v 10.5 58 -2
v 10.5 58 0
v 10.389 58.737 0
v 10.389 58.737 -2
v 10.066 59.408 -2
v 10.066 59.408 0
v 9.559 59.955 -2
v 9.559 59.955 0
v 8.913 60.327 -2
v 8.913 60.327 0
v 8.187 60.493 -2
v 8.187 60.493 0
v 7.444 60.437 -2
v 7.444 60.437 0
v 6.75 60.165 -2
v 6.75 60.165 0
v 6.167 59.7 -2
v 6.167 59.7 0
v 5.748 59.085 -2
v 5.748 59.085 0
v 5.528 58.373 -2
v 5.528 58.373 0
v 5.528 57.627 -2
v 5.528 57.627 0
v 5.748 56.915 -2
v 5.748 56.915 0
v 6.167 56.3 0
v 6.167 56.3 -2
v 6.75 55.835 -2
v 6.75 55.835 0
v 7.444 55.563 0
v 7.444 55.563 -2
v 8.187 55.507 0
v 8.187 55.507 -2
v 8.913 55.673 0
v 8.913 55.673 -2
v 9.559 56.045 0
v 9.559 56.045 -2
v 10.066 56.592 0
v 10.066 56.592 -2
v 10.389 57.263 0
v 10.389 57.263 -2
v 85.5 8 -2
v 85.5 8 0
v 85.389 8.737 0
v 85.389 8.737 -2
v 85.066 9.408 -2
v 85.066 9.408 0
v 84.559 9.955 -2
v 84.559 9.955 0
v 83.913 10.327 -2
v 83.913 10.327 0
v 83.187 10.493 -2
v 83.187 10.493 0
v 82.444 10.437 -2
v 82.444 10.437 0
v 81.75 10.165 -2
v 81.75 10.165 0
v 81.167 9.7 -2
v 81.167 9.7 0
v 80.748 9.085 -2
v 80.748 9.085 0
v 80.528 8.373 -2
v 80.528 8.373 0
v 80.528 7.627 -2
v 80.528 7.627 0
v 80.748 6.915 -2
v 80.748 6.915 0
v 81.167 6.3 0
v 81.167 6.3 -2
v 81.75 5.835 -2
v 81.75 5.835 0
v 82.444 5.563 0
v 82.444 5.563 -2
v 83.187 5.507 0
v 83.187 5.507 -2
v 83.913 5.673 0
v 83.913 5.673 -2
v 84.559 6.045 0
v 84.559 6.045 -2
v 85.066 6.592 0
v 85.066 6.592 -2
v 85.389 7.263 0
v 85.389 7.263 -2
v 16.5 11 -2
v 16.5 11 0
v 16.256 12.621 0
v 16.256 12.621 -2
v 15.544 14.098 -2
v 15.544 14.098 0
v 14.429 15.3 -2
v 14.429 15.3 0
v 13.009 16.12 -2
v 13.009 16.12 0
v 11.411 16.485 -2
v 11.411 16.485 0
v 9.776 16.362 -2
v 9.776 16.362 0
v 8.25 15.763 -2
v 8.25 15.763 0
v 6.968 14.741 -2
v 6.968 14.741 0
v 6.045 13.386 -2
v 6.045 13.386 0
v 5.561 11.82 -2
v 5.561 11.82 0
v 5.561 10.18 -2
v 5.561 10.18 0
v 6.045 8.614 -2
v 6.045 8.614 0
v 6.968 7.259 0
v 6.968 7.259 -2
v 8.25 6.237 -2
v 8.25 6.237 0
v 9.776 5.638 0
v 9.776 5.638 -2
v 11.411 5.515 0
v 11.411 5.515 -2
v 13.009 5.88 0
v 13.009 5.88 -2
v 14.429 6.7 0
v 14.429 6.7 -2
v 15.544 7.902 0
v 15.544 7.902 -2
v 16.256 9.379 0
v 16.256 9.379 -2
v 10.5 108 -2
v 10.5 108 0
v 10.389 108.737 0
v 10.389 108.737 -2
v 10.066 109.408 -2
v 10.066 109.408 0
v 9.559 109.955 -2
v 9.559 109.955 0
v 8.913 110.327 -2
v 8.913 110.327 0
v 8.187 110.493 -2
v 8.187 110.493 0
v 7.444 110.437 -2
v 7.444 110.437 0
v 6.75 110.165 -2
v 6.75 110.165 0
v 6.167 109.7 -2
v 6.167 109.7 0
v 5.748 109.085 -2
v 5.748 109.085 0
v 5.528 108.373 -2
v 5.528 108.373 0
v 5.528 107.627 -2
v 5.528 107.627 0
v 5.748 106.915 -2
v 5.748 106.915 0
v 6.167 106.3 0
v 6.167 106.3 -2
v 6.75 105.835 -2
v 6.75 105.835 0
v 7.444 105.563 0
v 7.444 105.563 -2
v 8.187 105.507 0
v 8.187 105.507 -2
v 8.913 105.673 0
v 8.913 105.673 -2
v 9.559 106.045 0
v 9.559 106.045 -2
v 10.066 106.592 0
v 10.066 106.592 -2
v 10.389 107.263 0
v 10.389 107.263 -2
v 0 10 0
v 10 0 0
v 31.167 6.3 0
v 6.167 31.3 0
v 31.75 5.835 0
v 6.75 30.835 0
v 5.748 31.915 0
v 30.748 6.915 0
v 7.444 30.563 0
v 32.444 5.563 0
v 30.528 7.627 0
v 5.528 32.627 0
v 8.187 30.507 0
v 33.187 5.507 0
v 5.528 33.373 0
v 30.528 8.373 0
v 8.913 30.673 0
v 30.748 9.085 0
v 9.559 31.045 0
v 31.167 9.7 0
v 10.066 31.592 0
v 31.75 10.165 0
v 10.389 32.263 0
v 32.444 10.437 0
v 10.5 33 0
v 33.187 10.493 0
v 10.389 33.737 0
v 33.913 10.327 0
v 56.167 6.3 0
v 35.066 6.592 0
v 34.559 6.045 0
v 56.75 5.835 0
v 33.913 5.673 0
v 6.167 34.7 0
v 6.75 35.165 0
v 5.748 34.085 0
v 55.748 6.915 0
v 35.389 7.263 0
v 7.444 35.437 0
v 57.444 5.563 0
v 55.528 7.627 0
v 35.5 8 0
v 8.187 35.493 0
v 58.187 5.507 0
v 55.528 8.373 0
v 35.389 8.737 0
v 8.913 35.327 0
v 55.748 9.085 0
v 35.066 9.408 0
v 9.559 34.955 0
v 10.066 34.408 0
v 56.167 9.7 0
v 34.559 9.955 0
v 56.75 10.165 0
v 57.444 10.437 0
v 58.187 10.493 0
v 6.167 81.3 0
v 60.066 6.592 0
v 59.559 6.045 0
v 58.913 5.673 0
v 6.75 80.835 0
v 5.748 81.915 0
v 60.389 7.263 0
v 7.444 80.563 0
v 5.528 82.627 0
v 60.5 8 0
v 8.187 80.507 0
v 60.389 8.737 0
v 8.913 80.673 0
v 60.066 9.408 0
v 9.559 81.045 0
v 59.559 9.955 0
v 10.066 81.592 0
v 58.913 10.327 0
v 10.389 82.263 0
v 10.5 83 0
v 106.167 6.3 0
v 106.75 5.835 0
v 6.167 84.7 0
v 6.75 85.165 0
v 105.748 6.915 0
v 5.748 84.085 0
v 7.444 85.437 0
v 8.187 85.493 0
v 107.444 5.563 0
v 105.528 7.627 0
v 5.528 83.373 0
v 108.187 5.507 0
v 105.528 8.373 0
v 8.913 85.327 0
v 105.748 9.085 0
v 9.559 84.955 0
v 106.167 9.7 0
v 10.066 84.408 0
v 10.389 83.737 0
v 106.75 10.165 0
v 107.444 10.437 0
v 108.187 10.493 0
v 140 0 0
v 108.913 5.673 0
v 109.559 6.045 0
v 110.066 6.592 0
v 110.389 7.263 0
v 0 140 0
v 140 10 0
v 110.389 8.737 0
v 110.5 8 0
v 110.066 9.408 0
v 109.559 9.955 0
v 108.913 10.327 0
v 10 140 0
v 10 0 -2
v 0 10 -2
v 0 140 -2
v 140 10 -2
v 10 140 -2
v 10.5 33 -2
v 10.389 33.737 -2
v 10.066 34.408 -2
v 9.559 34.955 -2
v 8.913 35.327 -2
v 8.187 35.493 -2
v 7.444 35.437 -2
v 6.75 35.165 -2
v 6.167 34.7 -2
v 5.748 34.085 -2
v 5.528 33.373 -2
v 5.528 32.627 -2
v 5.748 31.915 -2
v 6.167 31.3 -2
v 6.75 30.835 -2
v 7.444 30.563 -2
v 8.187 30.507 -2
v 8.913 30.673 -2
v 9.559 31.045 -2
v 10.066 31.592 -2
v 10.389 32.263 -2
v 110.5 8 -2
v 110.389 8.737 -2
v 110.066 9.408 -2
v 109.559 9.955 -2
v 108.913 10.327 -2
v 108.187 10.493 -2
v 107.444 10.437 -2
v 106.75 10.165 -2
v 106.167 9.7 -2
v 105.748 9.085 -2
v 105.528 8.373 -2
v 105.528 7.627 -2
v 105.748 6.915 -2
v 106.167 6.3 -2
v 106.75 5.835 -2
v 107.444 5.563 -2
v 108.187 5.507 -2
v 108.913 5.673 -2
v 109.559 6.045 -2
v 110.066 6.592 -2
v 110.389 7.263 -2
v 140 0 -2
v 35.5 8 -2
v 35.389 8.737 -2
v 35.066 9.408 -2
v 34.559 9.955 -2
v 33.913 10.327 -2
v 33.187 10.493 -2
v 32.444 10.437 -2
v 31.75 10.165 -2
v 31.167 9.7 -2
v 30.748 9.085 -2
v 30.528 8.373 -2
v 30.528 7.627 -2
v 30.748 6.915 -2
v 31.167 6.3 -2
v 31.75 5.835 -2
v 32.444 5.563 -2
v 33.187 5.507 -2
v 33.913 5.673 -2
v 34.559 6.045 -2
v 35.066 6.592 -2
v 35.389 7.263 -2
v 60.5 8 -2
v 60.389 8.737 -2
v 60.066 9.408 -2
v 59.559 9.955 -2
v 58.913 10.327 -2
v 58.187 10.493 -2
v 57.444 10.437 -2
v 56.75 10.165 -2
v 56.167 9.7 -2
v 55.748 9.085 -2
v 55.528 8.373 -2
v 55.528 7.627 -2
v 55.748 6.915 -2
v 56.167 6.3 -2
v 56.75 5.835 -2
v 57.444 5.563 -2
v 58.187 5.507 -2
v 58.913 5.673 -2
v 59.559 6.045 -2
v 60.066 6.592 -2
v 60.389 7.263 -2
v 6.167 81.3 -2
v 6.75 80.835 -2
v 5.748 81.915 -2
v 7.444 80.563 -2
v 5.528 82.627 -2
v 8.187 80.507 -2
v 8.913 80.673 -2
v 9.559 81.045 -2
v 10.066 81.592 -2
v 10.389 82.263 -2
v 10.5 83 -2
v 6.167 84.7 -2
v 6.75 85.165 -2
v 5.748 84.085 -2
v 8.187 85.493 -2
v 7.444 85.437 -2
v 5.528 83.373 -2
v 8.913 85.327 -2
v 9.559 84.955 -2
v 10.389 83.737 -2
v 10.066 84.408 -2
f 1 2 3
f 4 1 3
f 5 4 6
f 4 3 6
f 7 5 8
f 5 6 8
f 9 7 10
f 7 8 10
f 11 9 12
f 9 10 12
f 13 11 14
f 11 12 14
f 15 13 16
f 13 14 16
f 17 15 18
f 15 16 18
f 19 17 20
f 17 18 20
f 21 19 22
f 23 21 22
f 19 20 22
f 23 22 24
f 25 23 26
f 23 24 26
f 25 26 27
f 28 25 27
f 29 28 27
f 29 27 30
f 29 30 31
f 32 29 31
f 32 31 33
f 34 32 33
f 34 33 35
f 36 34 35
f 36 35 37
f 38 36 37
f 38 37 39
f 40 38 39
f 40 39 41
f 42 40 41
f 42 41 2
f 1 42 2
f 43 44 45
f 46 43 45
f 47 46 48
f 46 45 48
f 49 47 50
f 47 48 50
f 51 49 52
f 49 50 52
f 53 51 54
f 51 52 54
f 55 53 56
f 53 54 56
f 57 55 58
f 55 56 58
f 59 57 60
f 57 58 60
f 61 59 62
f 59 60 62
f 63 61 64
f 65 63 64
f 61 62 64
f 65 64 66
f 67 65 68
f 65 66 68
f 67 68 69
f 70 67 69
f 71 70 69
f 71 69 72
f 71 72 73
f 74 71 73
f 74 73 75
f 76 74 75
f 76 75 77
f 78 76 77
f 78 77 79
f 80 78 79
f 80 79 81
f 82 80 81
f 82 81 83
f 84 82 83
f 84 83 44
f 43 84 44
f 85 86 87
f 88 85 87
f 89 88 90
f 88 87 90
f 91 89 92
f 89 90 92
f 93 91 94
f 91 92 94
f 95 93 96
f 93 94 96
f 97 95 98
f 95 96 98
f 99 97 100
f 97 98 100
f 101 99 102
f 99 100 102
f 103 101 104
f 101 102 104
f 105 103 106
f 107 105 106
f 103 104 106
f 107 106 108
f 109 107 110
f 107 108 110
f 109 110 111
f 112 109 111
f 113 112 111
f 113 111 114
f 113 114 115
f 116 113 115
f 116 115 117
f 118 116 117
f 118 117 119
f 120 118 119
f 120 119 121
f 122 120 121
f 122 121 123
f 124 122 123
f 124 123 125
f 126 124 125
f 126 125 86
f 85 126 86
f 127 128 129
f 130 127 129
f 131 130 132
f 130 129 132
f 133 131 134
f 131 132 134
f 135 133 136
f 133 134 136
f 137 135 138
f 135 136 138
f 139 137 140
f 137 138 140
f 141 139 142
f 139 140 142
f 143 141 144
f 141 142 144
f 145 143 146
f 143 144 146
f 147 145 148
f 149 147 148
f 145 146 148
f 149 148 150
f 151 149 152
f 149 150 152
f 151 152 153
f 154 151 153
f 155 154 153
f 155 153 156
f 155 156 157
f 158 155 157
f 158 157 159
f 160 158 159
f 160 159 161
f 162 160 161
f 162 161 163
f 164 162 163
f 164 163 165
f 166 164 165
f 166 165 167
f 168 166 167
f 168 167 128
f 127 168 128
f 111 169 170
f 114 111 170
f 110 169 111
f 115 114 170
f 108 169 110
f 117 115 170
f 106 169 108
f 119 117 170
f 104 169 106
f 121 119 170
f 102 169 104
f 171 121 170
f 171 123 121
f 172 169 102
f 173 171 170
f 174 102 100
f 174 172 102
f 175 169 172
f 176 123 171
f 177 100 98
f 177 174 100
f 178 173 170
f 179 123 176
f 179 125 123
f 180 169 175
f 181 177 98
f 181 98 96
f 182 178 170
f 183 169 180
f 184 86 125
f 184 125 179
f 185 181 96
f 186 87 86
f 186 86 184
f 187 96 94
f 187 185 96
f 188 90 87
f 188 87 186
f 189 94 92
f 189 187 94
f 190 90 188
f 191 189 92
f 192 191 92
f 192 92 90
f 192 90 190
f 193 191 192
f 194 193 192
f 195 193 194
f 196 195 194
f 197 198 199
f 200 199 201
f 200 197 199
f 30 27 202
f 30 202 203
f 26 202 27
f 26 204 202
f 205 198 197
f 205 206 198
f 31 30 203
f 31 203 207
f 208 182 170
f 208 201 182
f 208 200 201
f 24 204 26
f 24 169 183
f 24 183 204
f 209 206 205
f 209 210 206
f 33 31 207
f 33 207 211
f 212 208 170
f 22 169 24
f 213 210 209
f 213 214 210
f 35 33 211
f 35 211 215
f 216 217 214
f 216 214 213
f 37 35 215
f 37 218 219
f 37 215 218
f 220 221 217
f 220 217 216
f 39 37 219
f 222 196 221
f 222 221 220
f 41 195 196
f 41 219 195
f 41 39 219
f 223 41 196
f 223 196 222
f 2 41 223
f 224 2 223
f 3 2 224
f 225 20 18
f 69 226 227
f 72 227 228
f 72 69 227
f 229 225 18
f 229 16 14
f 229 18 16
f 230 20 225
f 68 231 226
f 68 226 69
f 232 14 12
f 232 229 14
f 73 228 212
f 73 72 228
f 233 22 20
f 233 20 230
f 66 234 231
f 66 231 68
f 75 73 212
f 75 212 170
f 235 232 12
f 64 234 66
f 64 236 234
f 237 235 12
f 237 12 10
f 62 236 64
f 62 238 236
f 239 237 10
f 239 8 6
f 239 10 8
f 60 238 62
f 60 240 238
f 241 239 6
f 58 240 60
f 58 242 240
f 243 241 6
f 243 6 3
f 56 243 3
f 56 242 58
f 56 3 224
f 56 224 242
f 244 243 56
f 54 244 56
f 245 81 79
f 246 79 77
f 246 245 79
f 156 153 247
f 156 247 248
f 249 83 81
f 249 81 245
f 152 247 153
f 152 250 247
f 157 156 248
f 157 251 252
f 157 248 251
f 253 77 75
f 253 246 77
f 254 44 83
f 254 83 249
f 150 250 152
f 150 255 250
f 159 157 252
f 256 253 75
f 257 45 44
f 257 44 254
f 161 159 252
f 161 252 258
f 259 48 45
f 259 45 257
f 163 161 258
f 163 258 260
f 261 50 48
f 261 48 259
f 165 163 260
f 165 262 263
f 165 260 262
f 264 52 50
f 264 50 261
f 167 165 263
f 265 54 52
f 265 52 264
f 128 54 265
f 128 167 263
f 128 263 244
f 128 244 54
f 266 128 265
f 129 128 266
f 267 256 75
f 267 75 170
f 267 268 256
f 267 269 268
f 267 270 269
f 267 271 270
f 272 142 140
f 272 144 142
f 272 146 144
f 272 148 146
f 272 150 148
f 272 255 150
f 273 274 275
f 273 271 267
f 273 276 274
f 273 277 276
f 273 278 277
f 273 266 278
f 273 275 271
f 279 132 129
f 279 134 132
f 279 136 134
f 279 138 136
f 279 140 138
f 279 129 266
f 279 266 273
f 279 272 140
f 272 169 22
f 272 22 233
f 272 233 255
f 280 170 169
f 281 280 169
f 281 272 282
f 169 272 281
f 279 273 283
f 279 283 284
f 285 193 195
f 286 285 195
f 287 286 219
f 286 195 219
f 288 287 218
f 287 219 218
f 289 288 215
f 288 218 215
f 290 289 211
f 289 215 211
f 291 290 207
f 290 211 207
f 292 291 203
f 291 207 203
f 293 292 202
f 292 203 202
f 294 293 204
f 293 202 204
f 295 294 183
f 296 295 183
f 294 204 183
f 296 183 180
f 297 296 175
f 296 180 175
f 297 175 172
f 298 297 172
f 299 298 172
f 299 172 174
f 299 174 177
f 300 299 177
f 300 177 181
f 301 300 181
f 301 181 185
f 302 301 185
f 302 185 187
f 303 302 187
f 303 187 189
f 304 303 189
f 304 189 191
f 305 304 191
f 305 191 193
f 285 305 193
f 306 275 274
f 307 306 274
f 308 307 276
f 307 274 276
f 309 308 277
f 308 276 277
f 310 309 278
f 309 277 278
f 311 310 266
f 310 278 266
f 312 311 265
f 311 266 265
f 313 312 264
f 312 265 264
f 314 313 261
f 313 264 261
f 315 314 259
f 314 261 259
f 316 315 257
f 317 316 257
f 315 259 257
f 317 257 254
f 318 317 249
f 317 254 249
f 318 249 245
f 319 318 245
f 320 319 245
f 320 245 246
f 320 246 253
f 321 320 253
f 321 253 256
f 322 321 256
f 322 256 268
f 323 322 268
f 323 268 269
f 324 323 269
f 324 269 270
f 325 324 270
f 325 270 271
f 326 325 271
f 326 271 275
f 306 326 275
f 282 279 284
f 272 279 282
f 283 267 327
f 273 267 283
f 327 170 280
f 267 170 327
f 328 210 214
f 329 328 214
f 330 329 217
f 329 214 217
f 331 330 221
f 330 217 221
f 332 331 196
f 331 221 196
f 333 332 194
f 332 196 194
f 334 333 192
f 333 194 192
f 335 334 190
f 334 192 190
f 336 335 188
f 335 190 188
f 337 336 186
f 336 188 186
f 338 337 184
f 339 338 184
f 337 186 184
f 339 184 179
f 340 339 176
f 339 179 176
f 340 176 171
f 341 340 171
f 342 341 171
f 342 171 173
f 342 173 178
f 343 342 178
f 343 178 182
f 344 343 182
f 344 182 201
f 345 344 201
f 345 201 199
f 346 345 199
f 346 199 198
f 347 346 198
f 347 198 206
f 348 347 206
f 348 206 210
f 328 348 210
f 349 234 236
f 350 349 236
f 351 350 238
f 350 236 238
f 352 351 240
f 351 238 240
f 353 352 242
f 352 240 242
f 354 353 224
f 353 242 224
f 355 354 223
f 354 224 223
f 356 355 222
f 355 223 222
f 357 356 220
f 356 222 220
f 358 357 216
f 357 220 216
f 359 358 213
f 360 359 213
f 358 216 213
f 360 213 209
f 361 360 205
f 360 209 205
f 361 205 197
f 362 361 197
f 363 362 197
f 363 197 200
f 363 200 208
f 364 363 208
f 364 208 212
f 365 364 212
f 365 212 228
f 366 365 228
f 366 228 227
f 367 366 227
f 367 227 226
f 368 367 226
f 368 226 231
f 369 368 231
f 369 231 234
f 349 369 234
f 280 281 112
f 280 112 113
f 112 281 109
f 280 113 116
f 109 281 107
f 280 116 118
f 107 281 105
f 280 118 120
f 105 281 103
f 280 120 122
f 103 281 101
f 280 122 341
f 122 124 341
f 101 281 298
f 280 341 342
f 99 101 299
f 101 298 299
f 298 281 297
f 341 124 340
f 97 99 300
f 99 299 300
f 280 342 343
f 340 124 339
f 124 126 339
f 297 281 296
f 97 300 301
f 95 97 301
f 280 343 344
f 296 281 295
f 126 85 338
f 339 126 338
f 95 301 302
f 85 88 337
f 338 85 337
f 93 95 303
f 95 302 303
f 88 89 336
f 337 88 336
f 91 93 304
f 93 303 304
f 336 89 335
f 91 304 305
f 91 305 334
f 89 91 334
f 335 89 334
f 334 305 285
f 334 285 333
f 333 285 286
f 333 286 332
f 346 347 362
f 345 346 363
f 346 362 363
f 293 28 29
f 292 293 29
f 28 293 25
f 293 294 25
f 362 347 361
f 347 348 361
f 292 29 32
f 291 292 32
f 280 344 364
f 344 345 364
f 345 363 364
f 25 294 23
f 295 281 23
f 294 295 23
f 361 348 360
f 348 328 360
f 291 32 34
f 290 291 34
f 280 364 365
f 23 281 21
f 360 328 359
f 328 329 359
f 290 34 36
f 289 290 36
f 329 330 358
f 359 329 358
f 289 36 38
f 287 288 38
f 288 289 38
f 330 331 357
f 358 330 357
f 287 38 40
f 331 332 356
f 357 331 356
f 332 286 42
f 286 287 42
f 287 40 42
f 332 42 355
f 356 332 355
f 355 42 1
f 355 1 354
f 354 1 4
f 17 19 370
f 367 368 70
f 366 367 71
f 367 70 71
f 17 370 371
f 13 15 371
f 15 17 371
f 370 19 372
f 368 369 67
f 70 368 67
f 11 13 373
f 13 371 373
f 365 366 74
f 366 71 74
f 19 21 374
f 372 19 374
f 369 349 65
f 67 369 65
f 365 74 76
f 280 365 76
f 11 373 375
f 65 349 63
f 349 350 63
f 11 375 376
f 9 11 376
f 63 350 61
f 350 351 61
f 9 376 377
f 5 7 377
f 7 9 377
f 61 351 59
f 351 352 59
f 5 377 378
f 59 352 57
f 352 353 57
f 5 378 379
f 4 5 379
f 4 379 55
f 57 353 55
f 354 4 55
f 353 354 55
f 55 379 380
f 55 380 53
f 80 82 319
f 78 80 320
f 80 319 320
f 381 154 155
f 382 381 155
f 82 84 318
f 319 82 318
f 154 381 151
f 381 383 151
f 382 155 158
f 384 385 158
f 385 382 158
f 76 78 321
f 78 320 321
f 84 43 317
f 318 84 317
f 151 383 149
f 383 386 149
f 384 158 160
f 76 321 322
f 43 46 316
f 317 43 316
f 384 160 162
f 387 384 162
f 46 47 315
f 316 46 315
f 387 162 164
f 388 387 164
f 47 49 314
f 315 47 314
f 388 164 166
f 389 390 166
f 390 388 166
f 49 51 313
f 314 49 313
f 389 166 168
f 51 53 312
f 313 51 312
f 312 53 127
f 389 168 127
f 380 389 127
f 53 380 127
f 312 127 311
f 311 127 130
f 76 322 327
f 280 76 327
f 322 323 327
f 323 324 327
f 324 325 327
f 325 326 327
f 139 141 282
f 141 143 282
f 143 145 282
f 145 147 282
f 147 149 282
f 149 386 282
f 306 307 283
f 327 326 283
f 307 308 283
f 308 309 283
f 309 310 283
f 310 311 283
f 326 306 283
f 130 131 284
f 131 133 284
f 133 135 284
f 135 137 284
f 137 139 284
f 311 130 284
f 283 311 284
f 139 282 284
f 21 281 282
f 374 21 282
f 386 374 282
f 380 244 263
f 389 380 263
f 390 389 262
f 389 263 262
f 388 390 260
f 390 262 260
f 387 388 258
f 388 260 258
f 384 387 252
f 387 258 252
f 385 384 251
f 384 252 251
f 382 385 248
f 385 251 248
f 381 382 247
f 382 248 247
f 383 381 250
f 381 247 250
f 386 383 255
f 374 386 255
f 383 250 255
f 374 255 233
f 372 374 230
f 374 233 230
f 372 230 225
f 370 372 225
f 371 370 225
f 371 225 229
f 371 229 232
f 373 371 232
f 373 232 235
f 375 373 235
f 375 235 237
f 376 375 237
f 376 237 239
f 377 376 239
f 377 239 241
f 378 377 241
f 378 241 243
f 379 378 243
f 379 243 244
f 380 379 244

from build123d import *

# Parameters (mm, degrees)
SM_BASE_FLANGE_1_DEPTH = 2
SKETCH_7_R             = 5.5
SKETCH_7_R_2           = 2.5
CUT_EXTRUDE_1_DEPTH    = 10


# Sheet-metal steps are written as plain solids
with BuildPart() as part:
    # Sketch 1 → Базовая кромка1 (new body)
    with BuildSketch(Plane.XY):
        Polygon((0, 0), (140, 0), (140, 10), (10, 140), (0, 140), align=None)
    extrude(amount=-SM_BASE_FLANGE_1_DEPTH)

    # Эскиз7 → Вырез-Вытянуть1 (cut)
    with BuildSketch(Plane.XY):
        Polygon((10, 0), (0, 10), (0, 0), align=None)
        with Locations((11, 11)):
            Circle(SKETCH_7_R)
        with Locations((8, 33)):
            Circle(SKETCH_7_R_2)
        with Locations((33, 8)):
            Circle(SKETCH_7_R_2)
        with Locations((58, 8)):
            Circle(SKETCH_7_R_2)
        with Locations((83, 8)):
            Circle(SKETCH_7_R_2)
        with Locations((8, 58)):
            Circle(SKETCH_7_R_2)
        with Locations((8, 108)):
            Circle(SKETCH_7_R_2)
        with Locations((8, 83)):
            Circle(SKETCH_7_R_2)
        with Locations((108, 8)):
            Circle(SKETCH_7_R_2)
    extrude(amount=-CUT_EXTRUDE_1_DEPTH, mode=Mode.SUBTRACT)


solid = part.part
